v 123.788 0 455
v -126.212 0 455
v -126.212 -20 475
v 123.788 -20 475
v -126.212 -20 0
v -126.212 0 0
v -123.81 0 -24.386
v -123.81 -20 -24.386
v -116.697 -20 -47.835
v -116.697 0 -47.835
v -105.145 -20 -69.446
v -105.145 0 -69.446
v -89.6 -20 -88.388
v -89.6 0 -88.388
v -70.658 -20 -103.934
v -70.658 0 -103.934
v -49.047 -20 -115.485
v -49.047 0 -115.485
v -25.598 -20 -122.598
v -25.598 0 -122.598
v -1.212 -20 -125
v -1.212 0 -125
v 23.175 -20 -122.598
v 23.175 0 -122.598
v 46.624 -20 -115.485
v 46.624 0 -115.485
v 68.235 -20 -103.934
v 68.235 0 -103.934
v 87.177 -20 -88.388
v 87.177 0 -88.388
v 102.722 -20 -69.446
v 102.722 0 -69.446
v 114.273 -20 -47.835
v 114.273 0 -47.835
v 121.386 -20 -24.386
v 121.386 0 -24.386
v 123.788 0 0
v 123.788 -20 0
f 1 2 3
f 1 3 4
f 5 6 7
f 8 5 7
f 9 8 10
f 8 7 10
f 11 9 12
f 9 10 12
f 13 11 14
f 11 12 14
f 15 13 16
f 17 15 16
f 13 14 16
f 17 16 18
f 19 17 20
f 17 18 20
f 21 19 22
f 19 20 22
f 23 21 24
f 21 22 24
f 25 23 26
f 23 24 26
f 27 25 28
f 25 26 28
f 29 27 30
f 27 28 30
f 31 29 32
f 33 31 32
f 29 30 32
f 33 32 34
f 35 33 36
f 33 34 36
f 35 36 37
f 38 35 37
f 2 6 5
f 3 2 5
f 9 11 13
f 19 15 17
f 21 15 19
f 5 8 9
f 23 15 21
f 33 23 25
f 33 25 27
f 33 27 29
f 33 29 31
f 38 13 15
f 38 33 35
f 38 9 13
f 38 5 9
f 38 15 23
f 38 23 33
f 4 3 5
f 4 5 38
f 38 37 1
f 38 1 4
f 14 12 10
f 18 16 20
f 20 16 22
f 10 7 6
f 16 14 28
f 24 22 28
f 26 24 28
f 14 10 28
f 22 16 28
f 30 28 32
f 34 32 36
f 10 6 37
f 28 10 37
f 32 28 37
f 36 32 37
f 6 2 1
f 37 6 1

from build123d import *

# Parameters (mm, degrees)
F1_DEPTH = 20
F0_W     = 250
F0_H     = 475
F2_DEPTH = 20
F3_SIZE  = 19.99999


# Not quite as in the source:
# - a fillet or chamfer is up to 0.001 mm smaller than in the source, because OpenCascade refuses the exact size


with BuildPart() as f1:
    # F0 (on Front) → F1 (new body)
    with BuildSketch(Plane.XZ):
        with BuildLine():
            Line((123.788267374, 0), (-126.211732626, 0))
            ThreePointArc((-126.211732626, 0), (-1.211732626, -125), (123.788267374, 0))
        make_face()
    extrude(amount=F1_DEPTH)

    # F0 (on Front) → F2 (join)
    with BuildSketch(Plane.XZ):
        with Locations((-1.211732626, 237.5)):
            Rectangle(F0_W, F0_H)
    extrude(amount=F2_DEPTH)

    # F3 (size 20 in the source; OpenCascade refuses exactly that, so slightly less here)
    f3_edges = [f1.edges().sort_by_distance(p)[0] for p in [
        (-1.211733, 0, 475),
    ]]
    chamfer(f3_edges, length=F3_SIZE)


solid = f1.part
